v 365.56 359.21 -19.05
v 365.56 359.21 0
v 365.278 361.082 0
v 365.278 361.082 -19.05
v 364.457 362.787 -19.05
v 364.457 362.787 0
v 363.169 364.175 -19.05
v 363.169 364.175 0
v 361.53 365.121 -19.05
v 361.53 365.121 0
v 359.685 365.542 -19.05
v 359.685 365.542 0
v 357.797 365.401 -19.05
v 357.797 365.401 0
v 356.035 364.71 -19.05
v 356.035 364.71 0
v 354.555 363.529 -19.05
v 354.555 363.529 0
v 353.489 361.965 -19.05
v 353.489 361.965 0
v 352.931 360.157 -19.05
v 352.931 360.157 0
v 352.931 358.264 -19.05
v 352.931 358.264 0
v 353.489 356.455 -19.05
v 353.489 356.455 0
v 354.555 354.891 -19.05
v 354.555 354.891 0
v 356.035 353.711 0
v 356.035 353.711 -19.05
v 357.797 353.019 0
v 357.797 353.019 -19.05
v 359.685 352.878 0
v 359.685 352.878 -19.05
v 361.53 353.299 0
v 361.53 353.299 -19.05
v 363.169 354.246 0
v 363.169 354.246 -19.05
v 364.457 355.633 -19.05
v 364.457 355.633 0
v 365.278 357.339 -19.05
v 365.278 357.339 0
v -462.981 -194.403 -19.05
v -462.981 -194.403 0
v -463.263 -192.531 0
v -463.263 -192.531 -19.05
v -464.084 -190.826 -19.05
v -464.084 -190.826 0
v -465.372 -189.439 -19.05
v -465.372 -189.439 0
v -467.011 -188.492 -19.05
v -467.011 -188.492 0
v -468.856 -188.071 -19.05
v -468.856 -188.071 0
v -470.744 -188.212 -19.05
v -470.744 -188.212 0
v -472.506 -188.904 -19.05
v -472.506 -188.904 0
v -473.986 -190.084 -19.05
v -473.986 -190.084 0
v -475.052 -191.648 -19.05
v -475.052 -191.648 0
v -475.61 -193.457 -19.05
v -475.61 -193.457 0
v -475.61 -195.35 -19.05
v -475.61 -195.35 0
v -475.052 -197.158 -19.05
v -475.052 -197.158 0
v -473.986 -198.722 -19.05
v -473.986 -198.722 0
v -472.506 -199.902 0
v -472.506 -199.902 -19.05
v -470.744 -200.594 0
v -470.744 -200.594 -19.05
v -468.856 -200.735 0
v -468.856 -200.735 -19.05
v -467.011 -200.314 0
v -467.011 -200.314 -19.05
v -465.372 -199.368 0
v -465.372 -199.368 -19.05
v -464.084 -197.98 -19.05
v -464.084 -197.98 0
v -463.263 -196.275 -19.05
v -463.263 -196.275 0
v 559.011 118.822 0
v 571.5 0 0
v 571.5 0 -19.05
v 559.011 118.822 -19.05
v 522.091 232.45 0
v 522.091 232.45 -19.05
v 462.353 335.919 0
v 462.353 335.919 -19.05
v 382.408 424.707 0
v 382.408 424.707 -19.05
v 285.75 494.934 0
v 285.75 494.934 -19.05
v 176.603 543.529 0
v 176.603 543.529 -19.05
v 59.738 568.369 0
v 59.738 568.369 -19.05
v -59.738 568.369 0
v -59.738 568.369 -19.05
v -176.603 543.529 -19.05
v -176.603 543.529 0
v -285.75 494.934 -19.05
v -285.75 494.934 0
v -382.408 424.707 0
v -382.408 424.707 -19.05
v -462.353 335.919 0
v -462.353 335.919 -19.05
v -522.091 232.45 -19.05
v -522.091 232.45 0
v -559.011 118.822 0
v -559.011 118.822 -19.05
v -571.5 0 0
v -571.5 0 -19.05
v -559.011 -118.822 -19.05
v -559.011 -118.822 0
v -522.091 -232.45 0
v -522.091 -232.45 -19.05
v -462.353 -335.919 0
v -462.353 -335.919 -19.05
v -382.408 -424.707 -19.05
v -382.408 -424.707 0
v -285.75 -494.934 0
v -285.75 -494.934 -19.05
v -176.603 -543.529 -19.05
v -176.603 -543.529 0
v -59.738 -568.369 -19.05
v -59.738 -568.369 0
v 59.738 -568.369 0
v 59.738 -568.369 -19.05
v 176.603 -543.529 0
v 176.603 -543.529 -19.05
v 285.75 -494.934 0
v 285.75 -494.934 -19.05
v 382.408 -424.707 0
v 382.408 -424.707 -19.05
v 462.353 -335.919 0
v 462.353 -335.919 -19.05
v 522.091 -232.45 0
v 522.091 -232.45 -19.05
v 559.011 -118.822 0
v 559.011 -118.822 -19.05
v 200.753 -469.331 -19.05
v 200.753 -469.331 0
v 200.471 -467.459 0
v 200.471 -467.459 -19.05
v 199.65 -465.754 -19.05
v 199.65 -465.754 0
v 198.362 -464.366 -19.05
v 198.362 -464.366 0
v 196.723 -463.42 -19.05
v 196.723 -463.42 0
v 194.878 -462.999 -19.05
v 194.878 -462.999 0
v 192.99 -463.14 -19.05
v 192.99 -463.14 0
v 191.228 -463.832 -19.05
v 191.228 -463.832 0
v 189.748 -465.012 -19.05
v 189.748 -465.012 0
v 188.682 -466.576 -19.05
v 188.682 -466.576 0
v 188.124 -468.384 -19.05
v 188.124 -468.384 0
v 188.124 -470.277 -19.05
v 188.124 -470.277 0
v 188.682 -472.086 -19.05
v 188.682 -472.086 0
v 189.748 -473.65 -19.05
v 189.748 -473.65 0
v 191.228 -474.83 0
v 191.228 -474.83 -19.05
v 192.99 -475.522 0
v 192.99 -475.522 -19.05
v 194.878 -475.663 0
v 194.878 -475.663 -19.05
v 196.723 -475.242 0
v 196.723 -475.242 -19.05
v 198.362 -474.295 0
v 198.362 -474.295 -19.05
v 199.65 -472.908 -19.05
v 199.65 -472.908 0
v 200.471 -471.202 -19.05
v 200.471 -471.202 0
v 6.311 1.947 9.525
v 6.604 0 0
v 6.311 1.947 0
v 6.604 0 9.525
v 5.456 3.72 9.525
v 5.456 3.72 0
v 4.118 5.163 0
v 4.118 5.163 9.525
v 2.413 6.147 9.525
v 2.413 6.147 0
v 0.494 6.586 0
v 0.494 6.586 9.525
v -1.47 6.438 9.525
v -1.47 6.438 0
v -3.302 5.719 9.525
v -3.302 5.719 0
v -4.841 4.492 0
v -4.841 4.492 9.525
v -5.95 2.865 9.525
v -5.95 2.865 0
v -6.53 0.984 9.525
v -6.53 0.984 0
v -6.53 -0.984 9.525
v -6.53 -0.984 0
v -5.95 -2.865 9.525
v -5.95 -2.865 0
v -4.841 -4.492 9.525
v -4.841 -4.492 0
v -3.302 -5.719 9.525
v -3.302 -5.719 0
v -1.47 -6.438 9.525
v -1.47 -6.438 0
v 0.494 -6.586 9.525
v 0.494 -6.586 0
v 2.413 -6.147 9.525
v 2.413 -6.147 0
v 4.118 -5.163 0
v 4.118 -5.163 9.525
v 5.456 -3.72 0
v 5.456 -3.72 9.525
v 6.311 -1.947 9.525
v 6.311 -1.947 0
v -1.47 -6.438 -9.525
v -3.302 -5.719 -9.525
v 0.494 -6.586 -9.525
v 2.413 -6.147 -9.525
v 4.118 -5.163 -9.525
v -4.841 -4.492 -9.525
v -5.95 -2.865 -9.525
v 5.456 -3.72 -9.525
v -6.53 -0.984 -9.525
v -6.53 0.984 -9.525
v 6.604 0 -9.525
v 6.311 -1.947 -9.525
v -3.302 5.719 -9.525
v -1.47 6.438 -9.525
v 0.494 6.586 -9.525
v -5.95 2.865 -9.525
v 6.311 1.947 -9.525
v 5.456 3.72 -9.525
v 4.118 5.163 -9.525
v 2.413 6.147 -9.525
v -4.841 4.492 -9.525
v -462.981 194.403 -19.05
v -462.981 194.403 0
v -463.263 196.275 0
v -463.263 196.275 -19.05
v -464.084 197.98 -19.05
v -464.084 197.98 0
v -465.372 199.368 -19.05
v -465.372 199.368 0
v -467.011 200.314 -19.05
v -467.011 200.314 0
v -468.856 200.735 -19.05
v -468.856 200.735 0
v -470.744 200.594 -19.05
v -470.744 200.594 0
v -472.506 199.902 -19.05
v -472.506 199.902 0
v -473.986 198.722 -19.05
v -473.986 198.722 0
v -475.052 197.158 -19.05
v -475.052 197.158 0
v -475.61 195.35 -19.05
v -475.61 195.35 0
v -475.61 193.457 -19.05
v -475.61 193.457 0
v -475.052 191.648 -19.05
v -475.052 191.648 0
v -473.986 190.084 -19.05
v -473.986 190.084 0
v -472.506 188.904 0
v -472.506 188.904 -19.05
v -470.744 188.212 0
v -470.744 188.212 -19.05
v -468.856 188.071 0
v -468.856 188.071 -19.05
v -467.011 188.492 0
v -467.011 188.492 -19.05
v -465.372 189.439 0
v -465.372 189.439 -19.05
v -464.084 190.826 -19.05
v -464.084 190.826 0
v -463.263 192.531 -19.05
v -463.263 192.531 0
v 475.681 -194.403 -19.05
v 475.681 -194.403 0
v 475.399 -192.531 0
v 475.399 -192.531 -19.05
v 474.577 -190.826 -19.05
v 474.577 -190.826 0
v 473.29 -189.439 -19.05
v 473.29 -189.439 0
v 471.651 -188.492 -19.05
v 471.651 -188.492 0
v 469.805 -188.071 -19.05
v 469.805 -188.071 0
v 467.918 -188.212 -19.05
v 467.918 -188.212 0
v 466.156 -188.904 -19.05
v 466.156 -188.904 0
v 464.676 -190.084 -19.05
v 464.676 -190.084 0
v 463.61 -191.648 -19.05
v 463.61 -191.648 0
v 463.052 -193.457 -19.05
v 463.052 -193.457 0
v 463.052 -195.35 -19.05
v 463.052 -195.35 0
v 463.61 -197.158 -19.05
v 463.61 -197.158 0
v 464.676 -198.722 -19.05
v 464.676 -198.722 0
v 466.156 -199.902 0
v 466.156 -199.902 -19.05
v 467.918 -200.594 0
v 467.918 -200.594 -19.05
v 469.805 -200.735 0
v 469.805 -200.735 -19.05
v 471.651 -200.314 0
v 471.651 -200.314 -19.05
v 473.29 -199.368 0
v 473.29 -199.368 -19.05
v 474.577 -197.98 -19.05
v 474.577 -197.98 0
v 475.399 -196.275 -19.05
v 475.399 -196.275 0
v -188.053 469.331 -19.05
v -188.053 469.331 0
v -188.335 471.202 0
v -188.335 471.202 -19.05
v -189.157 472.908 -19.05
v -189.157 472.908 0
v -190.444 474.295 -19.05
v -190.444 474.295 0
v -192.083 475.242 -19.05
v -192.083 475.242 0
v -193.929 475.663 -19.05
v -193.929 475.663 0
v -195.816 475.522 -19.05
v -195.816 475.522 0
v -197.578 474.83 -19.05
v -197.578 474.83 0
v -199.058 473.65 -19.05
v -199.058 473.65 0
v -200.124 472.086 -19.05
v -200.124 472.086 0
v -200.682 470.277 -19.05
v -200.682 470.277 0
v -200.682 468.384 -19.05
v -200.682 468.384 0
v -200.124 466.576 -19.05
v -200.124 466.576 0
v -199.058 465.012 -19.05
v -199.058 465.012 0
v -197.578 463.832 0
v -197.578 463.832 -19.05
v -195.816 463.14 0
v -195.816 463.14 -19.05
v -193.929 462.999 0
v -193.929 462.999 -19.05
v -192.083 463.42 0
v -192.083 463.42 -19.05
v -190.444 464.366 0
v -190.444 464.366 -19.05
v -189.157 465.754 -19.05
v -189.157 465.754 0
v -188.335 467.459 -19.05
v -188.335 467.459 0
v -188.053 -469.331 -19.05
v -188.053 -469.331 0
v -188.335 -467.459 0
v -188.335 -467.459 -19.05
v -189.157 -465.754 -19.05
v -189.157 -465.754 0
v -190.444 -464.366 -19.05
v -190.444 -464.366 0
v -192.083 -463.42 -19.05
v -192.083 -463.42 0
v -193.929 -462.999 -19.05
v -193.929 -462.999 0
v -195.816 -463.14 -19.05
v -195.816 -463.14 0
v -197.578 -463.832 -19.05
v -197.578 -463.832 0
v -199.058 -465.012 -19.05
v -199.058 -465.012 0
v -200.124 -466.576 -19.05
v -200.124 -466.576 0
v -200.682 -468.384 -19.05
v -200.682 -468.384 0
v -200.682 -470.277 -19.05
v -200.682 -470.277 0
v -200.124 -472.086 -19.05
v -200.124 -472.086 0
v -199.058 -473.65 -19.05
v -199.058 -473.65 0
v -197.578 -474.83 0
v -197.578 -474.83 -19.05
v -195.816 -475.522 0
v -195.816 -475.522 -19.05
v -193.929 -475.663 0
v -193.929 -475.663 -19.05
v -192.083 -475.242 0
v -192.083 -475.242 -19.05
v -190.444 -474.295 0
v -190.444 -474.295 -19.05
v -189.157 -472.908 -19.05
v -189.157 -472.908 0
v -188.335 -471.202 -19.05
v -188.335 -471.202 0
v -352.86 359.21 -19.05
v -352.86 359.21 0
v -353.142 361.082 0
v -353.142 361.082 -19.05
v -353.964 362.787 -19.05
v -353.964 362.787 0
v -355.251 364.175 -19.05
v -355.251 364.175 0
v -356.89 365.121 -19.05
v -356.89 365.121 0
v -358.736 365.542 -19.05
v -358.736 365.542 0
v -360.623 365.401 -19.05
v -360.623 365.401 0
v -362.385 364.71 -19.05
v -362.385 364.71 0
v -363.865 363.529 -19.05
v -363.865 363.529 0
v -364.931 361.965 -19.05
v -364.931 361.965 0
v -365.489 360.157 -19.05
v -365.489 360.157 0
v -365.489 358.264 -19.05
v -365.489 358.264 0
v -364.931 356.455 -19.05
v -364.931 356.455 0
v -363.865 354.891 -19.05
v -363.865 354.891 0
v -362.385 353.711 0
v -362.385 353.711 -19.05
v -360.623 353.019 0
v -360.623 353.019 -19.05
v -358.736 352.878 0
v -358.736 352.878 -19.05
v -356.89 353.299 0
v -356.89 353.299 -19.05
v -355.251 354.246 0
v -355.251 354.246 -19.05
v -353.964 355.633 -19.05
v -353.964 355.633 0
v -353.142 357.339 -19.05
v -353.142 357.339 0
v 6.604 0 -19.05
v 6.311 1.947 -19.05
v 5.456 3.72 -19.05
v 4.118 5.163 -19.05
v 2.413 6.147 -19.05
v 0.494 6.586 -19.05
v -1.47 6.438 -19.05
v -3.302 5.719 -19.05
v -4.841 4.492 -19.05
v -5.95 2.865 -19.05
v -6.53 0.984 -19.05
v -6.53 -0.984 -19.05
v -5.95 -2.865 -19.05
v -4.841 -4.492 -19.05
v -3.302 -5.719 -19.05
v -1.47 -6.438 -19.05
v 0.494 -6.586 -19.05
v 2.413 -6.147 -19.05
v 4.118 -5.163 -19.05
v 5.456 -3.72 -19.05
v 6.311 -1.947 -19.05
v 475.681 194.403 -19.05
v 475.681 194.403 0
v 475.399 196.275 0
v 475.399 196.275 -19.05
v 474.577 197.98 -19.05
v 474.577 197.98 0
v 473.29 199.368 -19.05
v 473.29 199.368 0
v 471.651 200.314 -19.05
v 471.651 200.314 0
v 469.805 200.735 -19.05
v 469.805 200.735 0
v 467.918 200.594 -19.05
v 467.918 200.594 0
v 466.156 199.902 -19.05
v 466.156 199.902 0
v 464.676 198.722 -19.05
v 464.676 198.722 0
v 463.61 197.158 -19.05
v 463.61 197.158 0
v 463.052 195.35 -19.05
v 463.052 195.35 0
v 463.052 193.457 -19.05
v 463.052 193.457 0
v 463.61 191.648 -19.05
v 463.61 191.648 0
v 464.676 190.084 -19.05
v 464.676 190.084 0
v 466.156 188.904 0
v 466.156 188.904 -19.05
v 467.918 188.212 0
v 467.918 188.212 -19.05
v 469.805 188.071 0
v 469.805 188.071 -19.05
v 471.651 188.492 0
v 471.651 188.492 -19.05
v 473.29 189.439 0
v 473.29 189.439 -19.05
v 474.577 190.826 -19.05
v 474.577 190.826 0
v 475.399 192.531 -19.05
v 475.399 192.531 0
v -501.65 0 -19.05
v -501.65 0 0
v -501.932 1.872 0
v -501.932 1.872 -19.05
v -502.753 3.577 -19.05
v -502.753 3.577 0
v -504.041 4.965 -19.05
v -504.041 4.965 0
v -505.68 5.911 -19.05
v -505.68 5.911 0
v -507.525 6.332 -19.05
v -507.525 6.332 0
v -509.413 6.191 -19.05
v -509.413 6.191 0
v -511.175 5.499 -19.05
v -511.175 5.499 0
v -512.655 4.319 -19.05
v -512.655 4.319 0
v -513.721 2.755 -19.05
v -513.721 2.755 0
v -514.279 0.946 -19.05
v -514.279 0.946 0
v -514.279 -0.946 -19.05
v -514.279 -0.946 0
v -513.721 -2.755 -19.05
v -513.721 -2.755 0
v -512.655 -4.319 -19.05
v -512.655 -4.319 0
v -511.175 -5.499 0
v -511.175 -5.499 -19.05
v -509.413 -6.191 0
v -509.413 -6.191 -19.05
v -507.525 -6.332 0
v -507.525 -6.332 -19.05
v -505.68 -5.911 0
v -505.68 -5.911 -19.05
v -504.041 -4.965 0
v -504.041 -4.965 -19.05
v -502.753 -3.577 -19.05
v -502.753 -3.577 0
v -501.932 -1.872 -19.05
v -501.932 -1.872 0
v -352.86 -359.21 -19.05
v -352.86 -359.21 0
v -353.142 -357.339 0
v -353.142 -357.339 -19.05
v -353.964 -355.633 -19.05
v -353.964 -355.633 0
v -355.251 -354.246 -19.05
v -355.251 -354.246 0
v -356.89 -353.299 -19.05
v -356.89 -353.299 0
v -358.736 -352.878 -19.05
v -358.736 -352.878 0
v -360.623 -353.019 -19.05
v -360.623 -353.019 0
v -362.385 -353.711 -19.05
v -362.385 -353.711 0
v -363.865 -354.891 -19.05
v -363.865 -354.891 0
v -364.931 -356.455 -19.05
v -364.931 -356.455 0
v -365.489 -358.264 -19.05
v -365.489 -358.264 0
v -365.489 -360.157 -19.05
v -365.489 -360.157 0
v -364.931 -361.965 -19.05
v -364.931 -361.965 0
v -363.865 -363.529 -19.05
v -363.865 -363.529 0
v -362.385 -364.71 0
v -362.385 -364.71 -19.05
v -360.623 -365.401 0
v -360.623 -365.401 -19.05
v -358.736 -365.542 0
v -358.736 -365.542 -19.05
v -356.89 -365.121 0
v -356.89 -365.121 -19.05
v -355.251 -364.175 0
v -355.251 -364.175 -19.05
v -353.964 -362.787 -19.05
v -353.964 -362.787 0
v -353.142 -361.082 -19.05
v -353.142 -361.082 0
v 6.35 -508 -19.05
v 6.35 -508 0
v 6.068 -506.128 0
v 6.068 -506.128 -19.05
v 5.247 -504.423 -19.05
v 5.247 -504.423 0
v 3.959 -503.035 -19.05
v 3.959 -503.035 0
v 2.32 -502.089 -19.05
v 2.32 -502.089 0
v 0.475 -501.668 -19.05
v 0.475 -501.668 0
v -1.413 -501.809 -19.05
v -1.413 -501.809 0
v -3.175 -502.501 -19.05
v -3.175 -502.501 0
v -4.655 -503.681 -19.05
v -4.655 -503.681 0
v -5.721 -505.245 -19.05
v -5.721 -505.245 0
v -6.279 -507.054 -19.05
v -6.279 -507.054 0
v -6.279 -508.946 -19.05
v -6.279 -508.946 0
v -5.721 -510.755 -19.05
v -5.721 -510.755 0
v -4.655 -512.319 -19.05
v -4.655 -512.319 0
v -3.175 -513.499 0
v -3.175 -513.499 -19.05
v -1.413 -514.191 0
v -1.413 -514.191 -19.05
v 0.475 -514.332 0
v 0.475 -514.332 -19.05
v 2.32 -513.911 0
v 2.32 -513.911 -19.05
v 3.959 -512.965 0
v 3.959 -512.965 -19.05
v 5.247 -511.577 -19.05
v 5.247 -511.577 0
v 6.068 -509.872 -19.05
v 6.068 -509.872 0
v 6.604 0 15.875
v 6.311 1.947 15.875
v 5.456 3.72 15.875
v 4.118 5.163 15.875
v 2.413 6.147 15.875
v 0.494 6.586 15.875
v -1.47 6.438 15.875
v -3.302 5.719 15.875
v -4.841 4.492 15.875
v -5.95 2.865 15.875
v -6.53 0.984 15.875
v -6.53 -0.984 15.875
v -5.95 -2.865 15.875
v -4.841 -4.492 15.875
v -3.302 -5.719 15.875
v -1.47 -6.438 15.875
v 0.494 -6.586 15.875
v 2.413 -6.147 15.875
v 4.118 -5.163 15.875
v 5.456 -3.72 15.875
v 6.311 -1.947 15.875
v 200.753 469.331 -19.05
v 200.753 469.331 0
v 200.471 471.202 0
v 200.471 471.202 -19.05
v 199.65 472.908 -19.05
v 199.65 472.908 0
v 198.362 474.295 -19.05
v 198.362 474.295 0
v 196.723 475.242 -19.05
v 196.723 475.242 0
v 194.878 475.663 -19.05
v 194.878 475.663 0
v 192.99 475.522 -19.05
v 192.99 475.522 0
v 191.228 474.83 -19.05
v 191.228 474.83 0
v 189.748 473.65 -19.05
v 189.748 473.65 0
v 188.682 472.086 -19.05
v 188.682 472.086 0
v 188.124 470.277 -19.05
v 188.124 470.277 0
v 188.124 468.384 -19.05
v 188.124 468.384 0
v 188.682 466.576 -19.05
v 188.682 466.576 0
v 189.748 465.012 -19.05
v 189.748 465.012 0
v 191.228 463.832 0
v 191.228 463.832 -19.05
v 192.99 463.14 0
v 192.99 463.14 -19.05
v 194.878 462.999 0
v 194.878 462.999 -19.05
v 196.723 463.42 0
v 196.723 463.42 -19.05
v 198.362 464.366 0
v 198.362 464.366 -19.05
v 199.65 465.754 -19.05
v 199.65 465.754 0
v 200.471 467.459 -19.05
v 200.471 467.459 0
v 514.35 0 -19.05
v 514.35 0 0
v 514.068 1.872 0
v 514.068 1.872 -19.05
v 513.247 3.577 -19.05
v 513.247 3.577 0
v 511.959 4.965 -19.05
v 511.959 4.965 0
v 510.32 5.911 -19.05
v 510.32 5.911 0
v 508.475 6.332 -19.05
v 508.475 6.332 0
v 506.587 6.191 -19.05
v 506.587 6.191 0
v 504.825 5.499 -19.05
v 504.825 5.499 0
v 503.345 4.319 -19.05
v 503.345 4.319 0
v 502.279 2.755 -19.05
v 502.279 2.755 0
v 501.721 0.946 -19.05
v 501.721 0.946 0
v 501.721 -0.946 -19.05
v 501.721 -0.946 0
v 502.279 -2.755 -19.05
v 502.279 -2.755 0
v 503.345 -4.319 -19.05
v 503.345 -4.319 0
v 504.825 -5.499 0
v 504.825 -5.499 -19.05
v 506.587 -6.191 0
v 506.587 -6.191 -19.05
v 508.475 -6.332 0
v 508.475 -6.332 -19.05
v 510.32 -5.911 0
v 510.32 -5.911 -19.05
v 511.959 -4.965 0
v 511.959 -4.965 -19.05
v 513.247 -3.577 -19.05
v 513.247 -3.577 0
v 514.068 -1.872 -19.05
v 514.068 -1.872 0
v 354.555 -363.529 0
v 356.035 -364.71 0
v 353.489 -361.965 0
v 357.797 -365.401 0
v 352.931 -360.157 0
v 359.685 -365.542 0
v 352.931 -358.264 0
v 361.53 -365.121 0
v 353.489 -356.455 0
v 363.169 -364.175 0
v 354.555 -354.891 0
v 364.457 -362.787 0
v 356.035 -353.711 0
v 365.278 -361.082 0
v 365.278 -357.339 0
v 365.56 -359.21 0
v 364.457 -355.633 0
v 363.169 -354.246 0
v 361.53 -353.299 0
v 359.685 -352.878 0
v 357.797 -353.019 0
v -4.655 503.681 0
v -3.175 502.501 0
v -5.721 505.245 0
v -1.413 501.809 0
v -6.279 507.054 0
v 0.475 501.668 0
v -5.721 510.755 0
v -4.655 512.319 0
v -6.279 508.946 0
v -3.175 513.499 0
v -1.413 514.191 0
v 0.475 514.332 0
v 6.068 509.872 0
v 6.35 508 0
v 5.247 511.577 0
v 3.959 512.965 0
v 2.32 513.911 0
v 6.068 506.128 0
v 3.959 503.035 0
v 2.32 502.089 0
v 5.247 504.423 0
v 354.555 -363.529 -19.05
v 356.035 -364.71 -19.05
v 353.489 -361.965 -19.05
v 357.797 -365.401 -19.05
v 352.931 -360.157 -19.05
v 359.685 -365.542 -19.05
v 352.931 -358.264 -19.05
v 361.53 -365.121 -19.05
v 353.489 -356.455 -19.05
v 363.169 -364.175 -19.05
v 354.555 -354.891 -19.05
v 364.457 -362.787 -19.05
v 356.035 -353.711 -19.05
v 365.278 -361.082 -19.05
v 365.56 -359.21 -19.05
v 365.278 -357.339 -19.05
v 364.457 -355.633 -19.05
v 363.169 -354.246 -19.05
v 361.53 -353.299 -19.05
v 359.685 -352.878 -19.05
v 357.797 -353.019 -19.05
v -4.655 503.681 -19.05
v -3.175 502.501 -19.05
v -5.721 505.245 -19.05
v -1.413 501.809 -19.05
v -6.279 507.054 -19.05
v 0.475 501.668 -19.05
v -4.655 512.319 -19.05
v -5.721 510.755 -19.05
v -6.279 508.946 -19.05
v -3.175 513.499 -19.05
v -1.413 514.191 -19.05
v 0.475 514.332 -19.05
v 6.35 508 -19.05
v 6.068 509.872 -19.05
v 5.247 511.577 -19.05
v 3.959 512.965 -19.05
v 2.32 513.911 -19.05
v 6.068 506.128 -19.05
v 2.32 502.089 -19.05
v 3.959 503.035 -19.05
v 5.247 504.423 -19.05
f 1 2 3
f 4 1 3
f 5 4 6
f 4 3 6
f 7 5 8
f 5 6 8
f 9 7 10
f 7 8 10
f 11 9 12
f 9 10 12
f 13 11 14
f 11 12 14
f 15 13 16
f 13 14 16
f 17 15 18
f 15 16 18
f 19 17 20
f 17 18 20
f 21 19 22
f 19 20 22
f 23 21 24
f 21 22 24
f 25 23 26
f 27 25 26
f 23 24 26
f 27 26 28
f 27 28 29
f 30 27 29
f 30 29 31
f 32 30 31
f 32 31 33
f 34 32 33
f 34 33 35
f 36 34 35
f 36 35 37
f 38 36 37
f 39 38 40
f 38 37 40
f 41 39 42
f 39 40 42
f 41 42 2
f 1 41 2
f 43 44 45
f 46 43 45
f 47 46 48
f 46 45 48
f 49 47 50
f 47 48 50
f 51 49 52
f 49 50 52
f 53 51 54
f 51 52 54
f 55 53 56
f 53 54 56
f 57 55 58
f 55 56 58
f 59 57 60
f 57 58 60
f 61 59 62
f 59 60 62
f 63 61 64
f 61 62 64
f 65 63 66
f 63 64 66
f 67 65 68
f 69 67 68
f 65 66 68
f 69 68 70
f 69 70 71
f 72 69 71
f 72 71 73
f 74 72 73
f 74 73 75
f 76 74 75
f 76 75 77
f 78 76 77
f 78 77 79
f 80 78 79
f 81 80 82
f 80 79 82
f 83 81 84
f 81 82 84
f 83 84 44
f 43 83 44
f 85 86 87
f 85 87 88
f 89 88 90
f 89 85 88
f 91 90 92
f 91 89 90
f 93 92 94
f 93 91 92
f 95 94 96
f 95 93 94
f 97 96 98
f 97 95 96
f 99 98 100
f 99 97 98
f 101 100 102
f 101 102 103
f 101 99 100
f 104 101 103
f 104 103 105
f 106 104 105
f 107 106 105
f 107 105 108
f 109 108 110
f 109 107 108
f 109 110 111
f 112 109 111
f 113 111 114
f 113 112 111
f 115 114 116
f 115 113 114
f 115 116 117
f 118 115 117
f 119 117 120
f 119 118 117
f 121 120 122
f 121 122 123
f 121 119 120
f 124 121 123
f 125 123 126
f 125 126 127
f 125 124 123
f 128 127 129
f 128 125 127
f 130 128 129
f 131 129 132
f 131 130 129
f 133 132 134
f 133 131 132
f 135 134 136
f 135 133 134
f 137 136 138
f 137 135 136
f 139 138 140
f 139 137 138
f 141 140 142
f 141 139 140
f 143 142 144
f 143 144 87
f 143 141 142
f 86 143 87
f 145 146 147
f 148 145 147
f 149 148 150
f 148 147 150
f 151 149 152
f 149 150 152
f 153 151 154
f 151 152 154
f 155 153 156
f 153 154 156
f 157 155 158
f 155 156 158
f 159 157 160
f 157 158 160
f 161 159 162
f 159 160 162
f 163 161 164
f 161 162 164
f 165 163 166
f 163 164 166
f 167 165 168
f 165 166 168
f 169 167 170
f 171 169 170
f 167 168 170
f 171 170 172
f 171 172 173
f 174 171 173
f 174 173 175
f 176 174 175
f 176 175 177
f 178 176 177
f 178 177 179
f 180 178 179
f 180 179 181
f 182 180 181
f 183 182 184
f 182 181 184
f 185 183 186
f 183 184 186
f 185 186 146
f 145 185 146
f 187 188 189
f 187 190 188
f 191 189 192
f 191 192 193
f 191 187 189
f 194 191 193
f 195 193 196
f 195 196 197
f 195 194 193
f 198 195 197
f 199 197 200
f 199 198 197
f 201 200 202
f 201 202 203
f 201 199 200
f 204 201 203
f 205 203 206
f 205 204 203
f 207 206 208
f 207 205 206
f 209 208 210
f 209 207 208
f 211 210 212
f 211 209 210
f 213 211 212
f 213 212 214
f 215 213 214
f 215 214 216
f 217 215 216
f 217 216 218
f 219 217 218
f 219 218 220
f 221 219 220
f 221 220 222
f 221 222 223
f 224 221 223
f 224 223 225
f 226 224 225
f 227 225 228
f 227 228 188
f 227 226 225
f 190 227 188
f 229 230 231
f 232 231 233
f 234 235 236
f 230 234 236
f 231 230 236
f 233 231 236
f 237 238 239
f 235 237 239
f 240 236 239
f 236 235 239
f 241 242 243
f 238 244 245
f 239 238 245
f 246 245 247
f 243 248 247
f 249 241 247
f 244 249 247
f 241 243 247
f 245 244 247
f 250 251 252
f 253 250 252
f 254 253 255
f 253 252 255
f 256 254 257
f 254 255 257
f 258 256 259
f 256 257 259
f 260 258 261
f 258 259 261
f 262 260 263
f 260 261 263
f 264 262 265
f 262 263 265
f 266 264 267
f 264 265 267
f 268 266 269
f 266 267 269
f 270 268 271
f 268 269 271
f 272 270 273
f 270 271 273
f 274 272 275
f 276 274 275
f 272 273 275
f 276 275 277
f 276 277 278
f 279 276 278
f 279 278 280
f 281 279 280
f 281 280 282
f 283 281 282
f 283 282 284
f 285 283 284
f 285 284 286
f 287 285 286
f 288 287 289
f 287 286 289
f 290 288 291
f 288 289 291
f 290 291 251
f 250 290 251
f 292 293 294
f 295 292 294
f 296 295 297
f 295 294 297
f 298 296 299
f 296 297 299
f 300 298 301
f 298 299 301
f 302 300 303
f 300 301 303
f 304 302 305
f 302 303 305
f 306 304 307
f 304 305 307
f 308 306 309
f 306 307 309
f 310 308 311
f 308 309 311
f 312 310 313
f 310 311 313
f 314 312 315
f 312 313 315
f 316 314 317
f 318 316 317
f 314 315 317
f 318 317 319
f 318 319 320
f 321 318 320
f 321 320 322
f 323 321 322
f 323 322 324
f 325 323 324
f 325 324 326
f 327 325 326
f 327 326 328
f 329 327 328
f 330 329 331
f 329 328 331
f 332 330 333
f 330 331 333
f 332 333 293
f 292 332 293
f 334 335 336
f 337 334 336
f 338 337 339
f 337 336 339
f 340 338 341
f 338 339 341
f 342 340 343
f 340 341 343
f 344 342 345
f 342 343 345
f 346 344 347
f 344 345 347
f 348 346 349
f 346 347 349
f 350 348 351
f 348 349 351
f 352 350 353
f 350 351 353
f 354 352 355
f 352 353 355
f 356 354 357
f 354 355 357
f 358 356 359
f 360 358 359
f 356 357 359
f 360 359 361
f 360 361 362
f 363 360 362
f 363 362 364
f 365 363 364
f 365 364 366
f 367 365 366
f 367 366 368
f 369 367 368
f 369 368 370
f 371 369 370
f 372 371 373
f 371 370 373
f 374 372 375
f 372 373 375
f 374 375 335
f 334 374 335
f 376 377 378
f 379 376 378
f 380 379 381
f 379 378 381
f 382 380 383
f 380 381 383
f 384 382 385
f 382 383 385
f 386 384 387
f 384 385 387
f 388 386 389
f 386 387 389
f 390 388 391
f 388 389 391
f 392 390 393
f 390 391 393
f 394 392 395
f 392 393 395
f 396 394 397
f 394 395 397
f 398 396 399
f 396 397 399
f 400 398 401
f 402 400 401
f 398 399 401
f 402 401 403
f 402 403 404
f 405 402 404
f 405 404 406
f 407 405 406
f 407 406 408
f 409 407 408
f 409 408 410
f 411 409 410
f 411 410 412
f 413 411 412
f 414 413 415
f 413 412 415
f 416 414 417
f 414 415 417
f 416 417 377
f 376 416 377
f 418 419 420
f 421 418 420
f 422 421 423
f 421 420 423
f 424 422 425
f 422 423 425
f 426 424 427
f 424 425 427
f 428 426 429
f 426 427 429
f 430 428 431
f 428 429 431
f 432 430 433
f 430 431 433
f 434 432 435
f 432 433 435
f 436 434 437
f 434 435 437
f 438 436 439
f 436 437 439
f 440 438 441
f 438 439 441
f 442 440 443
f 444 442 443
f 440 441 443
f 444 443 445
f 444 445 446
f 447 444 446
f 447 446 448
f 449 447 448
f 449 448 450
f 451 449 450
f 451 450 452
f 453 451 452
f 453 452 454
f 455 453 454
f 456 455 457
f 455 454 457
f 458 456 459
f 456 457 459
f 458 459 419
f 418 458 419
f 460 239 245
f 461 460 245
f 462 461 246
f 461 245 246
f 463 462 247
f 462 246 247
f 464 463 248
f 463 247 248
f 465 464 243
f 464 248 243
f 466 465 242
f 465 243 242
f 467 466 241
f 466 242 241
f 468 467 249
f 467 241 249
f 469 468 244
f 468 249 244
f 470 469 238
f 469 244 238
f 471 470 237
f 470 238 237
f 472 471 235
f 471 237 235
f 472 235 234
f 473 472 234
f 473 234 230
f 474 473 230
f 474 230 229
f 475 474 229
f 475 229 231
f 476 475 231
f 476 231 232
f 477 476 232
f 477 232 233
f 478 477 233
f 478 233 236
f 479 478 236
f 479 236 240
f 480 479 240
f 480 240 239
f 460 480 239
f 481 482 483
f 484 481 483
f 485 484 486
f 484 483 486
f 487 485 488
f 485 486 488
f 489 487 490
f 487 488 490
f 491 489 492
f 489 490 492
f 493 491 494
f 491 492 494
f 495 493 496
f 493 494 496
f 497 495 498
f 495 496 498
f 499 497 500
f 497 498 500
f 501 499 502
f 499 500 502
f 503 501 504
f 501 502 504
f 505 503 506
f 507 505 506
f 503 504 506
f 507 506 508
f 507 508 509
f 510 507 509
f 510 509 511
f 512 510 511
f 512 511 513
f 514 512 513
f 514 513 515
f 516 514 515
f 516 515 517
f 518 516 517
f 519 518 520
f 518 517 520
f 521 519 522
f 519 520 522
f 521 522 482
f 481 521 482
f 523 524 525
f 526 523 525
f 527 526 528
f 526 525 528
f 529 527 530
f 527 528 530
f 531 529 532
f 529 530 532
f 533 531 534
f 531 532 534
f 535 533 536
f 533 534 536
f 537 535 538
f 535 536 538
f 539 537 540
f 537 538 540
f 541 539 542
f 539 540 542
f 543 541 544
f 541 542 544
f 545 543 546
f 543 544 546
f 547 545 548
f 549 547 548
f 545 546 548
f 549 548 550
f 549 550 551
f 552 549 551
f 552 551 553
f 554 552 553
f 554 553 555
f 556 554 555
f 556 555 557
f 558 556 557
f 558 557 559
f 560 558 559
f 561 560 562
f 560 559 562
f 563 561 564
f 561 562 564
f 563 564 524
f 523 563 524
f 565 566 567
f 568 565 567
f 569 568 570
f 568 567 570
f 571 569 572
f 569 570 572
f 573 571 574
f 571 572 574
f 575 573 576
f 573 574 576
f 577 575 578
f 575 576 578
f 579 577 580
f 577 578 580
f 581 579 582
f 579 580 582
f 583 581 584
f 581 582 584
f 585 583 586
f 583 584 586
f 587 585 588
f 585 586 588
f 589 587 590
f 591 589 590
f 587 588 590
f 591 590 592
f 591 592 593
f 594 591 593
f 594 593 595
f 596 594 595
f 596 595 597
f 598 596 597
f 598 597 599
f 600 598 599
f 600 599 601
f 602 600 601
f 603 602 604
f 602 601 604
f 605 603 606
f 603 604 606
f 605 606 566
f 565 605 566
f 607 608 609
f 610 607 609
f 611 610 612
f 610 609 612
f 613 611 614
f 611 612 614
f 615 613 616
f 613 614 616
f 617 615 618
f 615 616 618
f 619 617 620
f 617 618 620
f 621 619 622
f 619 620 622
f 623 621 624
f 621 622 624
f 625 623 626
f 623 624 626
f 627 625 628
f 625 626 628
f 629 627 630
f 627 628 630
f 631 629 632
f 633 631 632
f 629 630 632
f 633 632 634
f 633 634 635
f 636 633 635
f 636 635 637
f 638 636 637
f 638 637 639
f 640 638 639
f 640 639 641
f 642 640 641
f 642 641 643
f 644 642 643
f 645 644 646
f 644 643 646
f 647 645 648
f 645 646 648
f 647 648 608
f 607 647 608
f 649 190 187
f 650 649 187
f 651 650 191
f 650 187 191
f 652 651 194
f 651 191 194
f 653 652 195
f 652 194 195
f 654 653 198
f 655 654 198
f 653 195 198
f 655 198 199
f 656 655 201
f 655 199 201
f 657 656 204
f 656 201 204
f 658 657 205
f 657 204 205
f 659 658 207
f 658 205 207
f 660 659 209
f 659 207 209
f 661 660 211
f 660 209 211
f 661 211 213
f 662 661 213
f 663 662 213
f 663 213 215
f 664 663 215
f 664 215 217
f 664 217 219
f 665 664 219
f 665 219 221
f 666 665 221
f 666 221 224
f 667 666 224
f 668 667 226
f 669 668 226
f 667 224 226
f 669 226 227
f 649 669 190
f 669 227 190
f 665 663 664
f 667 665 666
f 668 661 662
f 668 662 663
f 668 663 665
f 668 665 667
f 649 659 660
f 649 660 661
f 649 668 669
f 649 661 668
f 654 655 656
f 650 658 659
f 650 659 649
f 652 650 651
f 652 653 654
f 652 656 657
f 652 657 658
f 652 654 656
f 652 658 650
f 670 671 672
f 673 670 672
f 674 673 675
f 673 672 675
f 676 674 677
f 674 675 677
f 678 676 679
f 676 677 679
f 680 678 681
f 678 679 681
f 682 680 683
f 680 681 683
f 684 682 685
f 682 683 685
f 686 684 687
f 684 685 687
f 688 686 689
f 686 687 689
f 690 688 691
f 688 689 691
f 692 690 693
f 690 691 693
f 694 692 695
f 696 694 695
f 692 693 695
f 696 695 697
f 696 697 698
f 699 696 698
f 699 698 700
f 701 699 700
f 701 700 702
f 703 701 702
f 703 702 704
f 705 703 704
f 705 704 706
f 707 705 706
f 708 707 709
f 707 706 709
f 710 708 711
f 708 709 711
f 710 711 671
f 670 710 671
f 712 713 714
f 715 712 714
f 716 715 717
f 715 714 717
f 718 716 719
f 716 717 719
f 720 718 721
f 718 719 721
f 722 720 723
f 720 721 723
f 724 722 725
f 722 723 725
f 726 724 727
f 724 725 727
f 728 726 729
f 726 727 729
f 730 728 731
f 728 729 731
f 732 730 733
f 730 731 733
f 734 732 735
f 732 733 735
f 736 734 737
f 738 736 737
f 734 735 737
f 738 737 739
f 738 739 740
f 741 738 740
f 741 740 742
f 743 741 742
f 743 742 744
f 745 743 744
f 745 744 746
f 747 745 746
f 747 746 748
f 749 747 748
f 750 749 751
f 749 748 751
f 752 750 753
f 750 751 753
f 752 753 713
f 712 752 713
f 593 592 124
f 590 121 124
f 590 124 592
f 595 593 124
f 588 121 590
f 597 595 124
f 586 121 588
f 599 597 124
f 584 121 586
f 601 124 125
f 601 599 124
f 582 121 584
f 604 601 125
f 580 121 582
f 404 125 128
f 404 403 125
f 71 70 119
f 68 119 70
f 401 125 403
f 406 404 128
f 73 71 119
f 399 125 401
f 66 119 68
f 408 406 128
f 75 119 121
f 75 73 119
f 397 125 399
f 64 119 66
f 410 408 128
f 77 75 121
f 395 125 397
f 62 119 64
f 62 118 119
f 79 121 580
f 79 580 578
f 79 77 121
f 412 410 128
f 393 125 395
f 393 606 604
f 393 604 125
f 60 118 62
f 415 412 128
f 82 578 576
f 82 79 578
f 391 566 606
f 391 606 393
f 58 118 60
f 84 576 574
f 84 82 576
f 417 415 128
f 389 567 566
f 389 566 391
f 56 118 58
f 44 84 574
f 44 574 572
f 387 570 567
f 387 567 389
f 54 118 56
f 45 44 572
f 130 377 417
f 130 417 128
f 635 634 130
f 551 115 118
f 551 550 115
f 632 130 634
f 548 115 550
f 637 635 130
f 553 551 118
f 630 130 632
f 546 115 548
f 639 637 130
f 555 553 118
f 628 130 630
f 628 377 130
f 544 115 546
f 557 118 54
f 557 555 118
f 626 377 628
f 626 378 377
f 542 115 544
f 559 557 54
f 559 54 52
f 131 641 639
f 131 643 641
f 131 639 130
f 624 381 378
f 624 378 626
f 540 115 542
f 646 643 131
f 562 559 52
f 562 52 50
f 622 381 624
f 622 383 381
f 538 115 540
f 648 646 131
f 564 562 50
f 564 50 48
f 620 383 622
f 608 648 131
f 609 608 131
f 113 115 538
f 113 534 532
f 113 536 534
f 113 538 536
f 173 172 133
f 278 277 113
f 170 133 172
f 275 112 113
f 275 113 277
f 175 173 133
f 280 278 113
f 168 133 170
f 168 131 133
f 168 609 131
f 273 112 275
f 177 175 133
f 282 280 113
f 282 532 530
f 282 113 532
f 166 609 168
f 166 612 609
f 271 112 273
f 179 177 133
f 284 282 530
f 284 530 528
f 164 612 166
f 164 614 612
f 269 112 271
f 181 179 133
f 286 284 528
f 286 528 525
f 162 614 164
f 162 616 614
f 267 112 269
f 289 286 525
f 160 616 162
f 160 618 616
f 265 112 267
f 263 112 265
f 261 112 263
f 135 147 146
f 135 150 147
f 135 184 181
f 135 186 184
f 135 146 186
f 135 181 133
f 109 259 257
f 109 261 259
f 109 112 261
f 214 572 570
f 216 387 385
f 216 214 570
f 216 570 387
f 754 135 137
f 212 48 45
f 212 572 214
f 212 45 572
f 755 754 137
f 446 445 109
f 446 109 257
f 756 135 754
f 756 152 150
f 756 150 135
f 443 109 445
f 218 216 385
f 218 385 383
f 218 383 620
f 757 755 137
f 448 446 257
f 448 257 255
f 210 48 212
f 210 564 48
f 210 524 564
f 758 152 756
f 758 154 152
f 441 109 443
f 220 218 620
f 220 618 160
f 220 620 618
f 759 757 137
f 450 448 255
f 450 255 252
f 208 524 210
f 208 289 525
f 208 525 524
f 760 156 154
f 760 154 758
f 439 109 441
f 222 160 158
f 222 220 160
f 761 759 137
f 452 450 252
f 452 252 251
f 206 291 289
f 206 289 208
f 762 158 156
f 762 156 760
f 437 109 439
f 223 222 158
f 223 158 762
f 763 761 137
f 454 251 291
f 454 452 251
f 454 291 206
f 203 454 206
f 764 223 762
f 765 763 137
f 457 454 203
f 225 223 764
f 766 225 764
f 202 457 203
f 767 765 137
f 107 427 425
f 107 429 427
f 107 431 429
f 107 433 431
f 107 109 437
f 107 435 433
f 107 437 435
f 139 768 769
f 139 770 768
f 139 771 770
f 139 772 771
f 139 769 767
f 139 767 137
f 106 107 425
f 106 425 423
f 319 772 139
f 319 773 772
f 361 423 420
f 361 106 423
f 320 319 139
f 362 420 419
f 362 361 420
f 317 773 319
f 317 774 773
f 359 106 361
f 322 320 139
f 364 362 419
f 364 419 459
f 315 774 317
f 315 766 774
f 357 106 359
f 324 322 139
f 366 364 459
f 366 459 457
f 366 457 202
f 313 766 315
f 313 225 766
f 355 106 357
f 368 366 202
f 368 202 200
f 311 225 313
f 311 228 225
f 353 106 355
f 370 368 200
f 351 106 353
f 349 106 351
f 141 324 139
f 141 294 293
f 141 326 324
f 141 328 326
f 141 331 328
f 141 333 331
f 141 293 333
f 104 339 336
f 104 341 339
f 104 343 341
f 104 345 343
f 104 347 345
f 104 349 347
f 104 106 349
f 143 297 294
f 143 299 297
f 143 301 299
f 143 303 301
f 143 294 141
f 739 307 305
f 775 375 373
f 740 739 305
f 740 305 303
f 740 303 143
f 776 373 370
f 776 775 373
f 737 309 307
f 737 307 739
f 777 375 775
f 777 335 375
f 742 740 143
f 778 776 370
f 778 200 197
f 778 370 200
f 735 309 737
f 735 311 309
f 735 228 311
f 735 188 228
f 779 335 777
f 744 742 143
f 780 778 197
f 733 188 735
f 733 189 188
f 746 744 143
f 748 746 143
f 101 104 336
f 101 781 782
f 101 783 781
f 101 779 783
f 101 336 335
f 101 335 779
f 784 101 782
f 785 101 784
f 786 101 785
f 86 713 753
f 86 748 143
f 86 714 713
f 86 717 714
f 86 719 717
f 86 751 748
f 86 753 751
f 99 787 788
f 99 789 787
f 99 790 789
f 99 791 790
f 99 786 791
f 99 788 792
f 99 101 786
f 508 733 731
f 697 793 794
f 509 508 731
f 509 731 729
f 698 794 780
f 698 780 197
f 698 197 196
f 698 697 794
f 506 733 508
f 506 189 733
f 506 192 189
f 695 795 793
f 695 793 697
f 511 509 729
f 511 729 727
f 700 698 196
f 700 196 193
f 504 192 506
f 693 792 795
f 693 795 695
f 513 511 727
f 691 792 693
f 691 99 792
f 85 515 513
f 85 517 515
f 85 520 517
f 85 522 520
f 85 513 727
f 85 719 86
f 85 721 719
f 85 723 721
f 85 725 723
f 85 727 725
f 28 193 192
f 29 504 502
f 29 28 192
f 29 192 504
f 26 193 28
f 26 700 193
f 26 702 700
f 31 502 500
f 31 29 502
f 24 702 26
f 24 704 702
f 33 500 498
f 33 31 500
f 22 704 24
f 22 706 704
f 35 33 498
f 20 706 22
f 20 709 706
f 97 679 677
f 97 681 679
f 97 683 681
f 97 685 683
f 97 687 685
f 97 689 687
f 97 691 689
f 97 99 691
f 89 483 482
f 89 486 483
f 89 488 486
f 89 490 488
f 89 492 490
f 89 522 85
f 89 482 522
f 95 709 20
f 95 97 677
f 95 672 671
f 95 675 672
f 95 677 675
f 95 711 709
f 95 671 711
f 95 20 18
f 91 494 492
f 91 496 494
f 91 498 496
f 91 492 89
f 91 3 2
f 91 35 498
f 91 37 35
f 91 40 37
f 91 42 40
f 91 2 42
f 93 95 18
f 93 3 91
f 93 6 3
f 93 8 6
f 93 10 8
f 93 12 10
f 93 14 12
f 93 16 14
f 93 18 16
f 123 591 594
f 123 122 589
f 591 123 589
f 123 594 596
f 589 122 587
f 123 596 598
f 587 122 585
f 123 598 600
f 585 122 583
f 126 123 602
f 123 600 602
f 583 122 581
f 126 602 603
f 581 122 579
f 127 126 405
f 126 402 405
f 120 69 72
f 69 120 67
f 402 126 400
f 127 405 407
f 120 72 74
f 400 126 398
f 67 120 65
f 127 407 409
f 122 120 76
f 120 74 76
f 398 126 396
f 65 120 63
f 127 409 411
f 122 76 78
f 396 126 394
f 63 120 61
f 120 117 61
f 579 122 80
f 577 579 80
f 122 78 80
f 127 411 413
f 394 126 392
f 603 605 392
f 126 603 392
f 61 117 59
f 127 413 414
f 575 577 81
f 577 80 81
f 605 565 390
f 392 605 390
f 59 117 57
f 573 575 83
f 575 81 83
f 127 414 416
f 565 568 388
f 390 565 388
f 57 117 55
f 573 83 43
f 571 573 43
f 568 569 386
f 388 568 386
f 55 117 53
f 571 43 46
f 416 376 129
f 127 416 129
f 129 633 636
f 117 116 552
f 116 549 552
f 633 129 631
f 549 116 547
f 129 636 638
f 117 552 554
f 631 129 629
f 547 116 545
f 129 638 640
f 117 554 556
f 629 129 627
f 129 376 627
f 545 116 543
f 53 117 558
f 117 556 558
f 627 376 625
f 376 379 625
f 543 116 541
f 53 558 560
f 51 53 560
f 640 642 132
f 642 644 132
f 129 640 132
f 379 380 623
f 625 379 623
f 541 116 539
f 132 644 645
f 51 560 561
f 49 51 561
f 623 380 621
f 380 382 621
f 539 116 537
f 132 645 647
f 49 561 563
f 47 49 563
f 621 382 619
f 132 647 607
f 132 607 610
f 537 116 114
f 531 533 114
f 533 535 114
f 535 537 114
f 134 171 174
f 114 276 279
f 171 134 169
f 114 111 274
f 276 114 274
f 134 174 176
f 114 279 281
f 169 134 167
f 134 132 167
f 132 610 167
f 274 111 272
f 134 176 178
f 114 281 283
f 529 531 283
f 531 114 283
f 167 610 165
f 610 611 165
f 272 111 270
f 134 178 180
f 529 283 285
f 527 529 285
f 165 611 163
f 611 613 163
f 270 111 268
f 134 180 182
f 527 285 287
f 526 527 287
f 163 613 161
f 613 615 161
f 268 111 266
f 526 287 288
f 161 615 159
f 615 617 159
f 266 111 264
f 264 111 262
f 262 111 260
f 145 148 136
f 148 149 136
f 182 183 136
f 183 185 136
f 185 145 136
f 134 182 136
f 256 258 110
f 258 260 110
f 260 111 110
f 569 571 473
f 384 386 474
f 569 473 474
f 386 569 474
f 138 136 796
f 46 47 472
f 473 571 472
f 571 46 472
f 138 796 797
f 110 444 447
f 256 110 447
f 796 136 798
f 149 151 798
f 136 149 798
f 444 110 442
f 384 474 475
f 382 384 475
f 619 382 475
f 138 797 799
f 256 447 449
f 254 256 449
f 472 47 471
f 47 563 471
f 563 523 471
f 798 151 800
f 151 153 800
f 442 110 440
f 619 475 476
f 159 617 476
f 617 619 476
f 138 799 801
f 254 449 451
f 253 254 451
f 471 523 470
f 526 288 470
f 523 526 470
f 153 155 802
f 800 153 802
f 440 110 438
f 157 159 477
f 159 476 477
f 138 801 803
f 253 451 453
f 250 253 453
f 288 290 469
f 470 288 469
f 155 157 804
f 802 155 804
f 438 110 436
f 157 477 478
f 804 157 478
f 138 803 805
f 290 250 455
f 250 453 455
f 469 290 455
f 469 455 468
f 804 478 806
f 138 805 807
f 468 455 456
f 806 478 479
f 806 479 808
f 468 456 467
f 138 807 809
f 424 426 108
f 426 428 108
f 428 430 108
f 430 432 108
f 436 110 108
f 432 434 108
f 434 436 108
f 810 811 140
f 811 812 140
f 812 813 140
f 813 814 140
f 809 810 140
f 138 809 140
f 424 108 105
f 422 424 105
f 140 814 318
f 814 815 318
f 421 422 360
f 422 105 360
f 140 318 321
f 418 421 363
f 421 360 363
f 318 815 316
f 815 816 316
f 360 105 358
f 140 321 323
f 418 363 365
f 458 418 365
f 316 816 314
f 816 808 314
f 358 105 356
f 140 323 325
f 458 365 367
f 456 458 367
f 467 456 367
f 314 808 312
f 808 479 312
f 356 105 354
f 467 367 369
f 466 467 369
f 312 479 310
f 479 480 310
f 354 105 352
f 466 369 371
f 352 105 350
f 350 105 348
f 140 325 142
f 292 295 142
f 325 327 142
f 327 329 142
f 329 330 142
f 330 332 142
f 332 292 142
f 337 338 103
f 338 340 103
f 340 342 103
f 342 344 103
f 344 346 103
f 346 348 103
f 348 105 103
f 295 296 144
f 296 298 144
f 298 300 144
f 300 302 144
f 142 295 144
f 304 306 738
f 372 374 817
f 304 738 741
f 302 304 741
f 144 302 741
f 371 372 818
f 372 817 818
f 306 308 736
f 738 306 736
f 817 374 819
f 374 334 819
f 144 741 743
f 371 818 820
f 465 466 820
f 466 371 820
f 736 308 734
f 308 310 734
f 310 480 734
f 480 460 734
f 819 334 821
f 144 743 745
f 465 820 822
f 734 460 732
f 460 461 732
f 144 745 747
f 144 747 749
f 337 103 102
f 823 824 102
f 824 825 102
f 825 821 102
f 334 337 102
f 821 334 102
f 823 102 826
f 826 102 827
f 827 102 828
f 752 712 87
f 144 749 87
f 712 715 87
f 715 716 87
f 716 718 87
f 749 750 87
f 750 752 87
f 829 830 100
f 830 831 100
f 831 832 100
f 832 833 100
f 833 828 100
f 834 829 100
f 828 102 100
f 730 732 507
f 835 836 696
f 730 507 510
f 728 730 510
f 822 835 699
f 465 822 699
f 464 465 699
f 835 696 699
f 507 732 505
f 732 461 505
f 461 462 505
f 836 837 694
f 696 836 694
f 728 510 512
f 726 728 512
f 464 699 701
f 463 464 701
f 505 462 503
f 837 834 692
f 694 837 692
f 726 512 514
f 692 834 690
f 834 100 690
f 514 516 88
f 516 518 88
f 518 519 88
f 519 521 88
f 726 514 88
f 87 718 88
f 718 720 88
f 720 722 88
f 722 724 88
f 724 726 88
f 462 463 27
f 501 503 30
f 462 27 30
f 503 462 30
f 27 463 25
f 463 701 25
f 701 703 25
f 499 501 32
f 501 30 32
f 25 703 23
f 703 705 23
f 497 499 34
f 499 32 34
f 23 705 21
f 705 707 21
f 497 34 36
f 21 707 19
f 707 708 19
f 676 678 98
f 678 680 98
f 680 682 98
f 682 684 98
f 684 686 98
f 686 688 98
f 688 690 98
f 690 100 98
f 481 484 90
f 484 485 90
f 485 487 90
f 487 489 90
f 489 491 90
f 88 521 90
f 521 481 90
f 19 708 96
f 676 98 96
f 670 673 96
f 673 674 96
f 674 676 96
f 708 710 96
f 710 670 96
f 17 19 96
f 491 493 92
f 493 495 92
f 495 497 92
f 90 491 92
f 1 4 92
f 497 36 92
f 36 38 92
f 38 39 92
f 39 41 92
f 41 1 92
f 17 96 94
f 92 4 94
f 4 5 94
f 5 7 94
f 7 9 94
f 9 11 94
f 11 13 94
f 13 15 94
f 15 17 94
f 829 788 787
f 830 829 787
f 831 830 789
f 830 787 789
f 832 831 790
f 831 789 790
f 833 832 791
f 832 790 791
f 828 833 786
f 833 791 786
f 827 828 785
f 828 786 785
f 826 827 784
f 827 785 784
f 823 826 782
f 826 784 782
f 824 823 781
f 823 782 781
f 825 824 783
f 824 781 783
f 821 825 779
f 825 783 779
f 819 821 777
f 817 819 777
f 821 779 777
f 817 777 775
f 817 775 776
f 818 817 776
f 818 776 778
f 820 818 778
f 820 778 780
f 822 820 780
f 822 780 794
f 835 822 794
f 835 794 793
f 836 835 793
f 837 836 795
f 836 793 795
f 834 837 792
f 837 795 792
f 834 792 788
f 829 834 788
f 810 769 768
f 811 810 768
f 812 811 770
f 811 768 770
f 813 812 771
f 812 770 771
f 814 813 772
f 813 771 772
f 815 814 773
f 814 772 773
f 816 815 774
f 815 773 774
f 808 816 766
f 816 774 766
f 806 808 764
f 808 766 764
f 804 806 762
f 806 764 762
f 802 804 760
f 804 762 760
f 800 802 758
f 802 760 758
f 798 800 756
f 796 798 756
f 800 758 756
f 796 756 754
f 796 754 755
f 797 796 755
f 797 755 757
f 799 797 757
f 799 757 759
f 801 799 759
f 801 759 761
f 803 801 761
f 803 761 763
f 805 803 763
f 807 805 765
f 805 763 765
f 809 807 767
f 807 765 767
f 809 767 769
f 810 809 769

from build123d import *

# Parameters (mm, degrees)
F0_R     = 571.5
F0_R_2   = 6.35
F0_R_3   = 6.604
F1_DEPTH = 19.05
F2_DEPTH = 9.525
F3_DEPTH = 6.35


with BuildPart() as f1:
    # F0 (on Top) → F1 (new body)
    with BuildSketch(Plane.XY):
        Circle(F0_R)
        with Locations((-359.2102448428, -359.2102448428)):
            Circle(F0_R_2, mode=Mode.SUBTRACT)
        with Locations((-194.4031836415, -469.3308025157)):
            Circle(F0_R_2, mode=Mode.SUBTRACT)
        with Locations((-469.3308025157, -194.4031836415)):
            Circle(F0_R_2, mode=Mode.SUBTRACT)
        with Locations((0, -508)):
            Circle(F0_R_2, mode=Mode.SUBTRACT)
        with Locations((194.4031836415, -469.3308025157)):
            Circle(F0_R_2, mode=Mode.SUBTRACT)
        with Locations((359.2102448428, -359.2102448428)):
            Circle(F0_R_2, mode=Mode.SUBTRACT)
        with Locations((469.3308025157, -194.4031836415)):
            Circle(F0_R_2, mode=Mode.SUBTRACT)
        with Locations((-508, 0)):
            Circle(F0_R_2, mode=Mode.SUBTRACT)
        with Locations((-469.3308025157, 194.4031836415)):
            Circle(F0_R_2, mode=Mode.SUBTRACT)
        with Locations((-359.2102448428, 359.2102448428)):
            Circle(F0_R_2, mode=Mode.SUBTRACT)
        with Locations((-194.4031836415, 469.3308025157)):
            Circle(F0_R_2, mode=Mode.SUBTRACT)
        Circle(F0_R_3, mode=Mode.SUBTRACT)
        with Locations((508, 0)):
            Circle(F0_R_2, mode=Mode.SUBTRACT)
        with Locations((469.3308025157, 194.4031836415)):
            Circle(F0_R_2, mode=Mode.SUBTRACT)
        with Locations((0, 508)):
            Circle(F0_R_2, mode=Mode.SUBTRACT)
        with Locations((194.4031836415, 469.3308025157)):
            Circle(F0_R_2, mode=Mode.SUBTRACT)
        with Locations((359.2102448428, 359.2102448428)):
            Circle(F0_R_2, mode=Mode.SUBTRACT)
    extrude(amount=-F1_DEPTH)

    # F0 (on Top) → F2 (join, symmetric)
    with BuildSketch(Plane.XY):
        Circle(F0_R_3)
    extrude(amount=F2_DEPTH, both=True)

    # F3 (add): a face of the model
    f3_faces = [f1.faces().sort_by_distance(p)[0] for p in [
        (0, 0, 9.525),
    ]]
    extrude(f3_faces, amount=F3_DEPTH)


solid = f1.part
